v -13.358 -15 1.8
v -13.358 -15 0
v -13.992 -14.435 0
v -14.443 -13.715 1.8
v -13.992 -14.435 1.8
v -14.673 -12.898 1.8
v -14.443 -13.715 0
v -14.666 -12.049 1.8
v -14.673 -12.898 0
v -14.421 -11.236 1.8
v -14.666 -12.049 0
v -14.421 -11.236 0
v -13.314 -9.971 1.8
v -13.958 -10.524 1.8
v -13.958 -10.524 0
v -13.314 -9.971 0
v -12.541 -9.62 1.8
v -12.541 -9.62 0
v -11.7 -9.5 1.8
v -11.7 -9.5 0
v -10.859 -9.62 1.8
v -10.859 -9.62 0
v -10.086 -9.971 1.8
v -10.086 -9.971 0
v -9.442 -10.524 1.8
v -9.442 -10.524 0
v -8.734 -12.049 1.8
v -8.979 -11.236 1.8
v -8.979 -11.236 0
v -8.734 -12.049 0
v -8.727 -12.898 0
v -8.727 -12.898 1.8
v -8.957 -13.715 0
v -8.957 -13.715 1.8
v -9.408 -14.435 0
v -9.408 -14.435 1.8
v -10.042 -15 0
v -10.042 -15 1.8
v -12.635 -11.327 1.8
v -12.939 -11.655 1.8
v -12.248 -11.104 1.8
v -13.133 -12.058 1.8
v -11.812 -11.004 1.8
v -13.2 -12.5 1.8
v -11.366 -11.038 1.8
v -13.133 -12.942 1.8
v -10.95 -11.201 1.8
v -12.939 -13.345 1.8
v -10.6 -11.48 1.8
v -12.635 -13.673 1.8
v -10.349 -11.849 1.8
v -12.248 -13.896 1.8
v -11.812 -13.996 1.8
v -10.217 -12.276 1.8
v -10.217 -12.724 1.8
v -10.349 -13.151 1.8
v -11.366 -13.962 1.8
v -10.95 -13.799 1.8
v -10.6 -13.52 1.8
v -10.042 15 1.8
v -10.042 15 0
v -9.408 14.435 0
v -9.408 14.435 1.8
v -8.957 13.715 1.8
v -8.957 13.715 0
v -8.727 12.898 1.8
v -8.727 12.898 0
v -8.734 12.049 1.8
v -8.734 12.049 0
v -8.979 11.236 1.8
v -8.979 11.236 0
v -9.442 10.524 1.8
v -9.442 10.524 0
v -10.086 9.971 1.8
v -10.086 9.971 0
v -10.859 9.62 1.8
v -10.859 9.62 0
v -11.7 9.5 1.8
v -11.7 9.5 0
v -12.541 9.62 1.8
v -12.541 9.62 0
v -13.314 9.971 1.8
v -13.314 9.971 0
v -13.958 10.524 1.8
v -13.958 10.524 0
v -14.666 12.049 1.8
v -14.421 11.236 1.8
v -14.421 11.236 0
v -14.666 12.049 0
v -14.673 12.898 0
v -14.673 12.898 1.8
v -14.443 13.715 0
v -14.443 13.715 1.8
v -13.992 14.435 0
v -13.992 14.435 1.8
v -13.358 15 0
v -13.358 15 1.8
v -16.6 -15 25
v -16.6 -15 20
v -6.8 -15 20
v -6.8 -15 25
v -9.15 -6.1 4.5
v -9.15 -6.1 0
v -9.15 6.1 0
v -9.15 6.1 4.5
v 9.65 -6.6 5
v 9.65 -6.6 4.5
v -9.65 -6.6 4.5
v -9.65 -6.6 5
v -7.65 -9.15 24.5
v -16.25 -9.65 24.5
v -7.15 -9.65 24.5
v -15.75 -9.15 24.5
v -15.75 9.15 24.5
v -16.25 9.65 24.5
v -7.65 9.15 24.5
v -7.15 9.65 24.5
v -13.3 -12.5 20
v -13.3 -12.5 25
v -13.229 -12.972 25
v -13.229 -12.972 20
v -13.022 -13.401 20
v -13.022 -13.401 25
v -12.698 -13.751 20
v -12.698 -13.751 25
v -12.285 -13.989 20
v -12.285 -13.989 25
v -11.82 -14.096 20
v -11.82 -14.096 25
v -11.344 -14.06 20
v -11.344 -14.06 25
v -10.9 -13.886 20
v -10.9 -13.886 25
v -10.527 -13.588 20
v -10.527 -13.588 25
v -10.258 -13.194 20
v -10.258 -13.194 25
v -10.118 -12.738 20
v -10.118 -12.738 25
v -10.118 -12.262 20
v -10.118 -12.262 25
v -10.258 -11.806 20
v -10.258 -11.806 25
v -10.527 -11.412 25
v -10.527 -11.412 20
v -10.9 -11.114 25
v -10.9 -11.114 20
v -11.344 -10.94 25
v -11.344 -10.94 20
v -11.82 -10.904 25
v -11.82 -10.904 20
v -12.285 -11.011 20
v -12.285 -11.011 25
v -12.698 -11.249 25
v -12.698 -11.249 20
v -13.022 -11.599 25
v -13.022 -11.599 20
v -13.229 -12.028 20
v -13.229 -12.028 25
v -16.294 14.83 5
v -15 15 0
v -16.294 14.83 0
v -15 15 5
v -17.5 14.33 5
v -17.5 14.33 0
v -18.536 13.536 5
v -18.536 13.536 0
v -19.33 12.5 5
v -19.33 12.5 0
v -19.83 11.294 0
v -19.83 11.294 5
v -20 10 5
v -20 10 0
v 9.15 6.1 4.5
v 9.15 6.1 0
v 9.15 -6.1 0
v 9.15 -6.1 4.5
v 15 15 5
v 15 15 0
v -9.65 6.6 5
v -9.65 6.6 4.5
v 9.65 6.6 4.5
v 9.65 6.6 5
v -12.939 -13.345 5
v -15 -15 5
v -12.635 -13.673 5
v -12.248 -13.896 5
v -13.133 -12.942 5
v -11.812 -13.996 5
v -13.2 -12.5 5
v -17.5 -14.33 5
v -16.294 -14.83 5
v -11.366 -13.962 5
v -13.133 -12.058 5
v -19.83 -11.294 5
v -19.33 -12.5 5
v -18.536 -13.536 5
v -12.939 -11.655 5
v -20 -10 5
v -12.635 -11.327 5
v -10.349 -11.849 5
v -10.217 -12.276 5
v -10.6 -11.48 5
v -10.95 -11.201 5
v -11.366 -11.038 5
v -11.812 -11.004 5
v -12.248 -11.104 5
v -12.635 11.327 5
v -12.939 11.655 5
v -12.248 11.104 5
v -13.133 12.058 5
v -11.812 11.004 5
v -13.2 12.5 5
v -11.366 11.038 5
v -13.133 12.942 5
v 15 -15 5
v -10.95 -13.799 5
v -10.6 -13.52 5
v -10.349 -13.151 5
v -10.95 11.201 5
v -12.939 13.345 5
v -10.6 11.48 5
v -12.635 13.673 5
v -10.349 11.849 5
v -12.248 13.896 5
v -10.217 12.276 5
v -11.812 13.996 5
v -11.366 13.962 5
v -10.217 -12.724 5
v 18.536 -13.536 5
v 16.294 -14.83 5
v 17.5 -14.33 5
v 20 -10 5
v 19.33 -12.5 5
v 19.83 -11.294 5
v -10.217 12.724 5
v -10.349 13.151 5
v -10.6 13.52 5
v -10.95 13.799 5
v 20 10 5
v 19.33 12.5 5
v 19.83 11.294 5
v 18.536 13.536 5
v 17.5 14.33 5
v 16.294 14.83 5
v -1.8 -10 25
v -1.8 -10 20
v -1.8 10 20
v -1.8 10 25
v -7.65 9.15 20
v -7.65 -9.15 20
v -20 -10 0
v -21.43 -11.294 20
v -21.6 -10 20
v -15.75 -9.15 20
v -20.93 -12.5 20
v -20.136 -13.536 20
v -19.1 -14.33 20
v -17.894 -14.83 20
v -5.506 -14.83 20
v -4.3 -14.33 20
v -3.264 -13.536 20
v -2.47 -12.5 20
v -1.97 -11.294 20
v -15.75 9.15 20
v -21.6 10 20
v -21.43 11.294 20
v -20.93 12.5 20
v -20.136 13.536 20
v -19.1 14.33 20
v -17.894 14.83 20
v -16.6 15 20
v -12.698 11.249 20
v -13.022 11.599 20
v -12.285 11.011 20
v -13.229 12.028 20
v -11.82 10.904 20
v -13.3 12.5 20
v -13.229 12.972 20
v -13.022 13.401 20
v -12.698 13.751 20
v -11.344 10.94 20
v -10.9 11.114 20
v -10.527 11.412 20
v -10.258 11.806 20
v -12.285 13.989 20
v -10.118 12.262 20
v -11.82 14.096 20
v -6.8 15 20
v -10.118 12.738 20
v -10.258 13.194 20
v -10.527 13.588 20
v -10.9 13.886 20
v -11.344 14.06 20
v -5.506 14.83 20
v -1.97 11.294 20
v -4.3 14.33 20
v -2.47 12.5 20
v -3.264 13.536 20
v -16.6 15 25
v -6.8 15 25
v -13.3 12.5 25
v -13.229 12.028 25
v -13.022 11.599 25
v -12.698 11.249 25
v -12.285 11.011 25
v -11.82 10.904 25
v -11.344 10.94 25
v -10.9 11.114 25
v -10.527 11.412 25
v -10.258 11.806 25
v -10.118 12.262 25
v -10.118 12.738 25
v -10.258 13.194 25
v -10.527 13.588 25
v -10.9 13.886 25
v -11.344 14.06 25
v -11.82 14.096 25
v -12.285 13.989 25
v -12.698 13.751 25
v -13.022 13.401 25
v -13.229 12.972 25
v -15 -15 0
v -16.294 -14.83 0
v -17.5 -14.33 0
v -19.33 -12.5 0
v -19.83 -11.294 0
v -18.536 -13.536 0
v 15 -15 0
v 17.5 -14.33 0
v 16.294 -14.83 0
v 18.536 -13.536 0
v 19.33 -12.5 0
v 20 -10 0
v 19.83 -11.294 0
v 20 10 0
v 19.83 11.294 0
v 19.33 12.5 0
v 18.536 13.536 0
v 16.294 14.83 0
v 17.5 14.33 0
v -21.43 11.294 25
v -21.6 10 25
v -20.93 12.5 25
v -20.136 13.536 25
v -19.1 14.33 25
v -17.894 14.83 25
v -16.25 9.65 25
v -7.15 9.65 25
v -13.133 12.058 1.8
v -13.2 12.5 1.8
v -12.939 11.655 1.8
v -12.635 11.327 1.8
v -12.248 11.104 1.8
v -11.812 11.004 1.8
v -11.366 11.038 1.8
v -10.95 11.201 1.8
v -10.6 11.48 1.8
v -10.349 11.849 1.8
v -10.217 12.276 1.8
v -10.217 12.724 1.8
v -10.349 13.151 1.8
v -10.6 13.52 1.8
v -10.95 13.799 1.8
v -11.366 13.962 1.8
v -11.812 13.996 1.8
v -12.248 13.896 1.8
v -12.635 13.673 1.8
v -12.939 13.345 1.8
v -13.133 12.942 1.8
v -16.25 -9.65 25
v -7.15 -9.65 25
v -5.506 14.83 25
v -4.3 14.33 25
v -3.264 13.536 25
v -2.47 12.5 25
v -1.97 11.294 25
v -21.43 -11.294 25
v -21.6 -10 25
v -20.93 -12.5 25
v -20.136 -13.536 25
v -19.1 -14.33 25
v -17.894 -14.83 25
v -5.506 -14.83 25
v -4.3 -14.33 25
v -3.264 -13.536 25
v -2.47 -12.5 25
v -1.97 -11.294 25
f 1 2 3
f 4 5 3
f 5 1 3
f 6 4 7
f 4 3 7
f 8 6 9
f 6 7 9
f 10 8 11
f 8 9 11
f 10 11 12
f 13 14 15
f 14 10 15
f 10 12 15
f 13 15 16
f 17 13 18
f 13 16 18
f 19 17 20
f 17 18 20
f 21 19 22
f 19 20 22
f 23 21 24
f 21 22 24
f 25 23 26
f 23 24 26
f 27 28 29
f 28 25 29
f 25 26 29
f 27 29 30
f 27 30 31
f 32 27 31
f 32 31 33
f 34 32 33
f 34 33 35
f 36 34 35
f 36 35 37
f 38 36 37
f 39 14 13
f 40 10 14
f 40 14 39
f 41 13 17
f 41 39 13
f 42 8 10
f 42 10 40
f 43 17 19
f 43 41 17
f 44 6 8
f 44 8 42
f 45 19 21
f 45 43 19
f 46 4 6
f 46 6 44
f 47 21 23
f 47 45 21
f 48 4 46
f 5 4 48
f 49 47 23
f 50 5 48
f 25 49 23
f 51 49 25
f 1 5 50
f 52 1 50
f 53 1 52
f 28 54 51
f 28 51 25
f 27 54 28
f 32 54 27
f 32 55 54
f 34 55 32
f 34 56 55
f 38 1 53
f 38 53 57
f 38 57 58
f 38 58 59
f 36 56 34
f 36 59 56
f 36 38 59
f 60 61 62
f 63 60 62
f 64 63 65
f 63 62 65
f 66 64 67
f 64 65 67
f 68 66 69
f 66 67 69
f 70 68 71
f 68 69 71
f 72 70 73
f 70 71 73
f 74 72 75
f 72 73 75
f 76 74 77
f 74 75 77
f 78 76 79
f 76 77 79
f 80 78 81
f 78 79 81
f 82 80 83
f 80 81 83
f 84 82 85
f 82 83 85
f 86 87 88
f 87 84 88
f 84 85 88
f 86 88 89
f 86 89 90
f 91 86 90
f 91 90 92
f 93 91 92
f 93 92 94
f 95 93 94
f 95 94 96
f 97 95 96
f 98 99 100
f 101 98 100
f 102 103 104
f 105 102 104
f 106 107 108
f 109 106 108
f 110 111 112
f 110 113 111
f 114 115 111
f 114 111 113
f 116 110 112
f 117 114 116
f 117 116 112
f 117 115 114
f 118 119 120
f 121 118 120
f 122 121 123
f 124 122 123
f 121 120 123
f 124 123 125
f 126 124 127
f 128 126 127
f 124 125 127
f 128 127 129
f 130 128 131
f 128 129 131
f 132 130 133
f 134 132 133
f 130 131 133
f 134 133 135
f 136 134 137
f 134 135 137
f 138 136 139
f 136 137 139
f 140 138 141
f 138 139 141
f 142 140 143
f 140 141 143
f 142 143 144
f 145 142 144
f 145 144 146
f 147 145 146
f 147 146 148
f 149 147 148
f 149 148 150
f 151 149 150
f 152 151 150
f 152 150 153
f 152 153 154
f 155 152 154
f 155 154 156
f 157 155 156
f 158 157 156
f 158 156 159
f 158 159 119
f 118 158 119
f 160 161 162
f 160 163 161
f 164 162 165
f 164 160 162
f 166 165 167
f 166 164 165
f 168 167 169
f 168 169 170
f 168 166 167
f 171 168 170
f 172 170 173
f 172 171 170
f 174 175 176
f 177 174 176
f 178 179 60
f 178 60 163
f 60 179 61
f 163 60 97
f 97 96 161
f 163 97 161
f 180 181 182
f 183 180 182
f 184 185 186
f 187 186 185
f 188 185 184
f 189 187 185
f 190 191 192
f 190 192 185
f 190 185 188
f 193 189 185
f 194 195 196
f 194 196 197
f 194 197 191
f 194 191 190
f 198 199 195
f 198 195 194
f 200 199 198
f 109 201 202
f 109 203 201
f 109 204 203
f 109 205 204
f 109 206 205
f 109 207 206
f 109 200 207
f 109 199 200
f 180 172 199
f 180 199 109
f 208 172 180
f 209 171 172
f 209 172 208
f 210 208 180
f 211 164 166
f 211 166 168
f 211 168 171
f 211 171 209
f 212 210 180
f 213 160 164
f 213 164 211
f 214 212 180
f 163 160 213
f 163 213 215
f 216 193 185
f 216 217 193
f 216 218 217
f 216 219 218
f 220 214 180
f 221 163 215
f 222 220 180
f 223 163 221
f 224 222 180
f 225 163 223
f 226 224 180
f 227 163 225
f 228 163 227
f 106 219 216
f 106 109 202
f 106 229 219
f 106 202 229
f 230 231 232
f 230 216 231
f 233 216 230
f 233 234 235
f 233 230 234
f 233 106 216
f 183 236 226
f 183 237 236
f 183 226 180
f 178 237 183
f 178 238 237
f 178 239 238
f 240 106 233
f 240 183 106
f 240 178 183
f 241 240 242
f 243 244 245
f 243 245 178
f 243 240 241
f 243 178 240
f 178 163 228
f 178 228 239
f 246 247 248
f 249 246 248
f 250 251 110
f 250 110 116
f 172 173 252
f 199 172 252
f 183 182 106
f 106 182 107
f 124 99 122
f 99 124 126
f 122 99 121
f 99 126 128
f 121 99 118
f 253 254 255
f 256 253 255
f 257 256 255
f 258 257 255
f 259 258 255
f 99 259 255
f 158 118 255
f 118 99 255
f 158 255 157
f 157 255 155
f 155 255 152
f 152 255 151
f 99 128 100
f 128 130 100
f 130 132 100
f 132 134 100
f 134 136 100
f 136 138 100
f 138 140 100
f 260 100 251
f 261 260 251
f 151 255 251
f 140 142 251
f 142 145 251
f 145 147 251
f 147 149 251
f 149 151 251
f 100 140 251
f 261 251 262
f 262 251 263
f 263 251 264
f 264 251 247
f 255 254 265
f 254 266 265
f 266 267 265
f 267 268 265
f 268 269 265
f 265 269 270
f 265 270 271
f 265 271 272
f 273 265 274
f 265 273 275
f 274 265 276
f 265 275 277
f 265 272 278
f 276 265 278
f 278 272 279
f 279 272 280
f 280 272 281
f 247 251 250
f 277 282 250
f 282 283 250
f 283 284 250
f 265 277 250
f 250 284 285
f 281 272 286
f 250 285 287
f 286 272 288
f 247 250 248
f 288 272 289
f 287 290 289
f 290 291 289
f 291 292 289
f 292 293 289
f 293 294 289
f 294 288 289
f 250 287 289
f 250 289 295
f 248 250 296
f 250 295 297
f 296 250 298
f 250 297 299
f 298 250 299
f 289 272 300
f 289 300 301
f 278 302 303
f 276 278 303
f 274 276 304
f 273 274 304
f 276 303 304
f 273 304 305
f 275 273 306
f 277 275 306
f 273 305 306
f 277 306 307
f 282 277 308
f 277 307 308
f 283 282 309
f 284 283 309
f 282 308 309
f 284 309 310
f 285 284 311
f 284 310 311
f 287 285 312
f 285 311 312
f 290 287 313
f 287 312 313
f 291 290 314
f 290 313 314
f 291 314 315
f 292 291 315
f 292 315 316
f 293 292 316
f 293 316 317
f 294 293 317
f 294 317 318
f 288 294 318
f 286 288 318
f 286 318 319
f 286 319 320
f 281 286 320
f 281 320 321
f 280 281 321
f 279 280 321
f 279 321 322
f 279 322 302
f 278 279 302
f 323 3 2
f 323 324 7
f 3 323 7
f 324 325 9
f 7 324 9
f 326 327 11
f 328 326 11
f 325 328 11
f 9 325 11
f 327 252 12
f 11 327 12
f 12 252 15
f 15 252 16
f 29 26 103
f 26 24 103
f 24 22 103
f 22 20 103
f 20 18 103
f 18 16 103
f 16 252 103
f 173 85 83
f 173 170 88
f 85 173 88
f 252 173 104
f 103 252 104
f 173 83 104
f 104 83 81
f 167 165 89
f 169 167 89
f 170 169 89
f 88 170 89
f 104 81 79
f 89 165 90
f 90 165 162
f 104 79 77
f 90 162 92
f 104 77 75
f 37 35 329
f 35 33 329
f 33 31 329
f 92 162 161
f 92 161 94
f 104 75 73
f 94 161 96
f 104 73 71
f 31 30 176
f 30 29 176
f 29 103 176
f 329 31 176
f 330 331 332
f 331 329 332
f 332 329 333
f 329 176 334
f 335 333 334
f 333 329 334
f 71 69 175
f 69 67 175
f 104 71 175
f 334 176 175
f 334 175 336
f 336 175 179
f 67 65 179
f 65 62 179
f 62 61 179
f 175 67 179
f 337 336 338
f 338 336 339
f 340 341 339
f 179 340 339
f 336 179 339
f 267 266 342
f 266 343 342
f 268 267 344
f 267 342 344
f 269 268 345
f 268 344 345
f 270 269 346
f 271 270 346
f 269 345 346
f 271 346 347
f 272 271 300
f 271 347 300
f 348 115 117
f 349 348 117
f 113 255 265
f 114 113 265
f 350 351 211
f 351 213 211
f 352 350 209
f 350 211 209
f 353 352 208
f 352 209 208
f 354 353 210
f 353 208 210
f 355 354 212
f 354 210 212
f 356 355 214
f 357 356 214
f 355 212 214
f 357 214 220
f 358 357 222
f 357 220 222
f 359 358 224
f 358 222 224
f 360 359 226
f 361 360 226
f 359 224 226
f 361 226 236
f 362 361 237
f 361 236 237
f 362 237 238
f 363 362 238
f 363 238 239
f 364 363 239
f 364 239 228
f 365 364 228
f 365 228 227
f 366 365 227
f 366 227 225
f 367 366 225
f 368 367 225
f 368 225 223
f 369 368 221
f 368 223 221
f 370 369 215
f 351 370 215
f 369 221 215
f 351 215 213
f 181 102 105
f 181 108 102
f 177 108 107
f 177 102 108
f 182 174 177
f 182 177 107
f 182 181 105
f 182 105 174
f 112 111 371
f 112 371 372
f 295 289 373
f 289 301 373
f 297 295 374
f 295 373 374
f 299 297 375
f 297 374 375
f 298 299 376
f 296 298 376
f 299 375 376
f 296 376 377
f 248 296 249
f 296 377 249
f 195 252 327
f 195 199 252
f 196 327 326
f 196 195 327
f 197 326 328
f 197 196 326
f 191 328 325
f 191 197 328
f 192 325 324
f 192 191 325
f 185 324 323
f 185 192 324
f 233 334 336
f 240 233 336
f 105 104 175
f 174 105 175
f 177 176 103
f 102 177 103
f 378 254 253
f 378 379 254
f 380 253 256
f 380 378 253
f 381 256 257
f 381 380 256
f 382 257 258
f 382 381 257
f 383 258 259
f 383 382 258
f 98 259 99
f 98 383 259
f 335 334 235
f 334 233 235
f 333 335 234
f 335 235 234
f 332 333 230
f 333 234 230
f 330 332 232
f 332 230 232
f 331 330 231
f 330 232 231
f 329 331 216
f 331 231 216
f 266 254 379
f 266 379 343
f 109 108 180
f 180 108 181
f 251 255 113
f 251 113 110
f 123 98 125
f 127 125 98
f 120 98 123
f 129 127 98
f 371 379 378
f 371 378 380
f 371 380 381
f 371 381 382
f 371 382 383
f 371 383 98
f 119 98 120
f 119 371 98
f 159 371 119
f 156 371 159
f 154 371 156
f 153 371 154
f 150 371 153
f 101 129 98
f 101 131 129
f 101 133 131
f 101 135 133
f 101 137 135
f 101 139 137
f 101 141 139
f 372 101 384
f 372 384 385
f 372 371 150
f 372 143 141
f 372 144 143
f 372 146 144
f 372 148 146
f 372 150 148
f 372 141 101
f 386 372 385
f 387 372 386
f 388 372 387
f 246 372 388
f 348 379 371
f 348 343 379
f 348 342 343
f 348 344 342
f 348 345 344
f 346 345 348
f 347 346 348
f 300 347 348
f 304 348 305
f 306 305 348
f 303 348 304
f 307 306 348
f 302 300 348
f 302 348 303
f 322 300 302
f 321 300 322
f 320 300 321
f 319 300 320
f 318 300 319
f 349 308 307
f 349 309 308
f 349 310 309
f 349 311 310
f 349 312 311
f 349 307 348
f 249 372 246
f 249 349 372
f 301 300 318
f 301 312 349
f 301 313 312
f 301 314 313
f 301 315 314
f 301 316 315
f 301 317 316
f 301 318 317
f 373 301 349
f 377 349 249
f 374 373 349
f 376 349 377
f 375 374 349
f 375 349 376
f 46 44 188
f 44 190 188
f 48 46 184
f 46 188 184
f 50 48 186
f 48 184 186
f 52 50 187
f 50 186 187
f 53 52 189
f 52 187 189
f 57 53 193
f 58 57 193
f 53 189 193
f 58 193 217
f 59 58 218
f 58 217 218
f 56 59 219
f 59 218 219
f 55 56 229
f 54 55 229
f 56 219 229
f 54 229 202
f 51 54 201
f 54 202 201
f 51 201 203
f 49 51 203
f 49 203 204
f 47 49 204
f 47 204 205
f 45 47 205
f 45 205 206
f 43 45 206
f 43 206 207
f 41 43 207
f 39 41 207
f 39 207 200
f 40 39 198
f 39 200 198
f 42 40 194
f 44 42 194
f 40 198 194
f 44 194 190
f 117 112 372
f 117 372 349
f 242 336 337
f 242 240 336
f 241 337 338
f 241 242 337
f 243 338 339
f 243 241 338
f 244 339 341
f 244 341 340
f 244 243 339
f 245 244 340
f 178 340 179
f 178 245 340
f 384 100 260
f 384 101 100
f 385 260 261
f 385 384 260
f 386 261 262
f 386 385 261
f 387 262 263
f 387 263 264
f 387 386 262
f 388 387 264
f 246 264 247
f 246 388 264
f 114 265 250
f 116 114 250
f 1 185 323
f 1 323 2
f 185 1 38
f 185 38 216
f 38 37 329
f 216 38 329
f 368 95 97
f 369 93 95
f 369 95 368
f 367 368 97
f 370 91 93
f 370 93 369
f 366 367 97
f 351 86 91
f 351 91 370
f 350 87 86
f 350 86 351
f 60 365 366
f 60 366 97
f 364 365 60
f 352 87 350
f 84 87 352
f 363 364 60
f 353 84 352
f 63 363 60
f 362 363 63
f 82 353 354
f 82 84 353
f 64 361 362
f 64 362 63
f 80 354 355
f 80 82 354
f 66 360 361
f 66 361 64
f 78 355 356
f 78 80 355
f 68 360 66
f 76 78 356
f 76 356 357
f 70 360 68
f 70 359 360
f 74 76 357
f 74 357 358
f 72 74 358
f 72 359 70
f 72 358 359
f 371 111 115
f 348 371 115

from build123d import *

# Parameters (mm, degrees)
F1_DEPTH       = 5
F0_W           = 0.5
F0_H           = 0.5
F0_W_2         = 5.35
F2_DEPTH       = 4.5
F3_R           = 5
F4_D           = 3
F4_DEPTH       = 10
F4_CBORE_D     = 6
F4_CBORE_DEPTH = 1.8
F4_TIP         = 0.9012909285
F6_W           = 19.8
F6_H           = 30
F6_W_2         = 9.1
F6_H_2         = 19.3
F7_DEPTH       = 5
F6_W_3         = 8.1
F6_H_3         = 18.3
F8_DEPTH       = 4.5
F9_R           = 5
F10_D          = 3.2
F10_DEPTH      = 10
F10_TIP        = 0.9613769904


with BuildPart() as f1:
    # F0 (on Top) → F1 (new body)
    with BuildSketch(Plane.XY):
        Polygon((9.65, -6.6), (-1.8, -6.6), (-1.8, -15), (20, -15), (20, 15), (-1.8, 15), (-1.8, 6.6), (9.65, 6.6), align=None)
        Polygon((-7.65, -6.6), (-9.65, -6.6), (-9.65, 6.6), (-7.65, 6.6), (-7.65, 9.15), (-15.75, 9.15), (-15.75, -9.15), (-7.65, -9.15), align=None)
        Polygon((-7.15, -6.6), (-7.65, -6.6), (-7.65, -9.15), (-15.75, -9.15), (-15.75, 9.15), (-7.65, 9.15), (-7.65, 6.6), (-7.15, 6.6), (-7.15, 9.65), (-16.25, 9.65), (-16.25, -9.65), (-7.15, -9.65), align=None)
        Polygon((-1.8, -6.6), (-7.15, -6.6), (-7.15, -9.65), (-16.25, -9.65), (-16.25, 9.65), (-7.15, 9.65), (-7.15, 6.6), (-1.8, 6.6), (-1.8, 15), (-20, 15), (-20, -15), (-1.8, -15), align=None)
    extrude(amount=F1_DEPTH)

    # F0 (on Top) → F2 (join)
    with BuildSketch(Plane.XY):
        Polygon((-9.65, 6.6), (-9.65, -6.6), (-7.65, -6.6), (-7.65, -6.1), (-9.15, -6.1), (-9.15, 6.1), (-7.65, 6.1), (-7.65, 6.6), align=None)
        with Locations((-7.4, 6.35)):
            Rectangle(F0_W, F0_H)
        Polygon((-1.8, -6.1), (-1.8, -6.6), (9.65, -6.6), (9.65, 6.6), (-1.8, 6.6), (-1.8, 6.1), (9.15, 6.1), (9.15, -6.1), align=None)
        with Locations((-7.4, -6.35)):
            Rectangle(F0_W, F0_H)
        with Locations((-4.475, -6.35)):
            Rectangle(F0_W_2, F0_H)
        with Locations((-4.475, 6.35)):
            Rectangle(F0_W_2, F0_H)
    extrude(amount=F2_DEPTH)

    # F3
    f3_edges = [f1.edges().sort_by_distance(p)[0] for p in [
        (-20, -15, 2.5),
        (20, -15, 2.5),
        (-20, 15, 2.5),
        (20, 15, 2.5),
    ]]
    fillet(f3_edges, radius=F3_R)

    # F4
    with Locations(Plane(origin=(0, 0, 0), x_dir=(1, 0, 0), z_dir=(0, 0, -1))):
        with Locations((-11.7, 12.5), (-11.7, -12.5)):
            CounterBoreHole(F4_D / 2, F4_CBORE_D / 2, F4_CBORE_DEPTH, depth=F4_DEPTH)
            with Locations((0, 0, -(F4_DEPTH + F4_TIP / 2))):  # 118° drill point
                Cone(0, F4_D / 2, F4_TIP, mode=Mode.SUBTRACT)


with BuildPart() as f7:
    # F6 (on offset) → F7 (new body)
    with BuildSketch(Plane.XY.offset(20)):
        with Locations((-11.7, 0)):
            Rectangle(F6_W, F6_H)
        with Locations((-11.7, 0)):
            Rectangle(F6_W_2, F6_H_2, mode=Mode.SUBTRACT)
    extrude(amount=F7_DEPTH)

    # F6 (on offset) → F8 (join)
    with BuildSketch(Plane.XY.offset(20)):
        with Locations((-11.7, 0)):
            Rectangle(F6_W_2, F6_H_2)
        with Locations((-11.7, 0)):
            Rectangle(F6_W_3, F6_H_3, mode=Mode.SUBTRACT)
    extrude(amount=F8_DEPTH)

    # F9
    f9_edges = [f7.edges().sort_by_distance(p)[0] for p in [
        (-1.8, 15, 22.5),
        (-21.6, 15, 22.5),
        (-21.6, -15, 22.5),
        (-1.8, -15, 22.5),
    ]]
    fillet(f9_edges, radius=F9_R)

    # F10
    with Locations(Plane(origin=(0, 0, 20), x_dir=(1, 0, 0), z_dir=(0, 0, -1))):
        with Locations((-11.7, 12.5), (-11.7, -12.5)):
            Hole(F10_D / 2, depth=F10_DEPTH)
            with Locations((0, 0, -(F10_DEPTH + F10_TIP / 2))):  # 118° drill point
                Cone(0, F10_D / 2, F10_TIP, mode=Mode.SUBTRACT)


solid = Compound([f1.part, f7.part])
